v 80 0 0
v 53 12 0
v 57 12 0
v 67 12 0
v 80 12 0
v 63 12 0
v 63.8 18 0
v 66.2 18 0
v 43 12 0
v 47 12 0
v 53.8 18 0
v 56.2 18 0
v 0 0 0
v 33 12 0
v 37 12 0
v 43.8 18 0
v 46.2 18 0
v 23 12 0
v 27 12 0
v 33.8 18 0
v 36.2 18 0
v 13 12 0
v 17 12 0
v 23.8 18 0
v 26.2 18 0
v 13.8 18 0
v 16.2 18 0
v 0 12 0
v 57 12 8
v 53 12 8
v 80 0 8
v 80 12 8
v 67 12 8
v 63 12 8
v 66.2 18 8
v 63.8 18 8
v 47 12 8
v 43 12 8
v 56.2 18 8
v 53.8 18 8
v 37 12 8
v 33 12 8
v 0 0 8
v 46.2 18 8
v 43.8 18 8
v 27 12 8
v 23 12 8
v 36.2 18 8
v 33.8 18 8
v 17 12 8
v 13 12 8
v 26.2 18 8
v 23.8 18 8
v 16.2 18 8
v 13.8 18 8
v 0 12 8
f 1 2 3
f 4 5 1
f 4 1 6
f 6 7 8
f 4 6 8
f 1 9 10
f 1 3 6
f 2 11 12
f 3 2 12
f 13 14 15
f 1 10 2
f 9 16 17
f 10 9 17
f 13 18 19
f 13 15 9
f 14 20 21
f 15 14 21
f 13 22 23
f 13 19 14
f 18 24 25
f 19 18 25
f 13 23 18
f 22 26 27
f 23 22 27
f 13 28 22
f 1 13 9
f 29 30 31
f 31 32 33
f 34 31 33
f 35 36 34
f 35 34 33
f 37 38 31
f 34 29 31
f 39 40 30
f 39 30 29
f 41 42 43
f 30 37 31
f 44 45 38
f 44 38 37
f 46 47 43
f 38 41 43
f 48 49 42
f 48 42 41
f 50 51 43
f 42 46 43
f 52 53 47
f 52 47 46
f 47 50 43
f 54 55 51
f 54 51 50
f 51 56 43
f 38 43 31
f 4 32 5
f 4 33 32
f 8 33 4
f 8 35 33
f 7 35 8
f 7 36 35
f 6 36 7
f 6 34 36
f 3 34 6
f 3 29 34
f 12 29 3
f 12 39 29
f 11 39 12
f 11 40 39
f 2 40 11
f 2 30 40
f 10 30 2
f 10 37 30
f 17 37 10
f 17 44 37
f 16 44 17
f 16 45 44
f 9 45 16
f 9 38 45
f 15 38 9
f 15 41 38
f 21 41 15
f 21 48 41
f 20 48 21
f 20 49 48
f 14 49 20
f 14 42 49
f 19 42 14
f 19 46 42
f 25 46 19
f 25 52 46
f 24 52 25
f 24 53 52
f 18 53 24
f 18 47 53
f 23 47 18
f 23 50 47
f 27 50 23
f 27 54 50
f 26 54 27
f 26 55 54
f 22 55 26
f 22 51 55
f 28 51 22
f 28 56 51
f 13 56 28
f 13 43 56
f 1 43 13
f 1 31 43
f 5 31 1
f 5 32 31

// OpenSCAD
$fn = 32;

// ----------------------------------------------------------------------
// Gear rack: 6 teeth on a 80 mm bar, pitch 10 mm
// ----------------------------------------------------------------------

// --- parameters (mm) ---
profile_height = 8;       // extrusion height
profile_points = 28;      // points of the closed outline

profile = [[0, 0], [80, 0], [80, 12], [67, 12], [66.2, 18], [63.8, 18], [63, 12], [57, 12], [56.2, 18], [53.8, 18], [53, 12], [47, 12], [46.2, 18], [43.8, 18], [43, 12], [37, 12], [36.2, 18], [33.8, 18], [33, 12], [27, 12], [26.2, 18], [23.8, 18], [23, 12], [17, 12], [16.2, 18], [13.8, 18], [13, 12], [0, 12]];  // single closed polygon, 28 points, counter clockwise

// --- the one profile operation ---
linear_extrude(height = profile_height) polygon(points = profile);
